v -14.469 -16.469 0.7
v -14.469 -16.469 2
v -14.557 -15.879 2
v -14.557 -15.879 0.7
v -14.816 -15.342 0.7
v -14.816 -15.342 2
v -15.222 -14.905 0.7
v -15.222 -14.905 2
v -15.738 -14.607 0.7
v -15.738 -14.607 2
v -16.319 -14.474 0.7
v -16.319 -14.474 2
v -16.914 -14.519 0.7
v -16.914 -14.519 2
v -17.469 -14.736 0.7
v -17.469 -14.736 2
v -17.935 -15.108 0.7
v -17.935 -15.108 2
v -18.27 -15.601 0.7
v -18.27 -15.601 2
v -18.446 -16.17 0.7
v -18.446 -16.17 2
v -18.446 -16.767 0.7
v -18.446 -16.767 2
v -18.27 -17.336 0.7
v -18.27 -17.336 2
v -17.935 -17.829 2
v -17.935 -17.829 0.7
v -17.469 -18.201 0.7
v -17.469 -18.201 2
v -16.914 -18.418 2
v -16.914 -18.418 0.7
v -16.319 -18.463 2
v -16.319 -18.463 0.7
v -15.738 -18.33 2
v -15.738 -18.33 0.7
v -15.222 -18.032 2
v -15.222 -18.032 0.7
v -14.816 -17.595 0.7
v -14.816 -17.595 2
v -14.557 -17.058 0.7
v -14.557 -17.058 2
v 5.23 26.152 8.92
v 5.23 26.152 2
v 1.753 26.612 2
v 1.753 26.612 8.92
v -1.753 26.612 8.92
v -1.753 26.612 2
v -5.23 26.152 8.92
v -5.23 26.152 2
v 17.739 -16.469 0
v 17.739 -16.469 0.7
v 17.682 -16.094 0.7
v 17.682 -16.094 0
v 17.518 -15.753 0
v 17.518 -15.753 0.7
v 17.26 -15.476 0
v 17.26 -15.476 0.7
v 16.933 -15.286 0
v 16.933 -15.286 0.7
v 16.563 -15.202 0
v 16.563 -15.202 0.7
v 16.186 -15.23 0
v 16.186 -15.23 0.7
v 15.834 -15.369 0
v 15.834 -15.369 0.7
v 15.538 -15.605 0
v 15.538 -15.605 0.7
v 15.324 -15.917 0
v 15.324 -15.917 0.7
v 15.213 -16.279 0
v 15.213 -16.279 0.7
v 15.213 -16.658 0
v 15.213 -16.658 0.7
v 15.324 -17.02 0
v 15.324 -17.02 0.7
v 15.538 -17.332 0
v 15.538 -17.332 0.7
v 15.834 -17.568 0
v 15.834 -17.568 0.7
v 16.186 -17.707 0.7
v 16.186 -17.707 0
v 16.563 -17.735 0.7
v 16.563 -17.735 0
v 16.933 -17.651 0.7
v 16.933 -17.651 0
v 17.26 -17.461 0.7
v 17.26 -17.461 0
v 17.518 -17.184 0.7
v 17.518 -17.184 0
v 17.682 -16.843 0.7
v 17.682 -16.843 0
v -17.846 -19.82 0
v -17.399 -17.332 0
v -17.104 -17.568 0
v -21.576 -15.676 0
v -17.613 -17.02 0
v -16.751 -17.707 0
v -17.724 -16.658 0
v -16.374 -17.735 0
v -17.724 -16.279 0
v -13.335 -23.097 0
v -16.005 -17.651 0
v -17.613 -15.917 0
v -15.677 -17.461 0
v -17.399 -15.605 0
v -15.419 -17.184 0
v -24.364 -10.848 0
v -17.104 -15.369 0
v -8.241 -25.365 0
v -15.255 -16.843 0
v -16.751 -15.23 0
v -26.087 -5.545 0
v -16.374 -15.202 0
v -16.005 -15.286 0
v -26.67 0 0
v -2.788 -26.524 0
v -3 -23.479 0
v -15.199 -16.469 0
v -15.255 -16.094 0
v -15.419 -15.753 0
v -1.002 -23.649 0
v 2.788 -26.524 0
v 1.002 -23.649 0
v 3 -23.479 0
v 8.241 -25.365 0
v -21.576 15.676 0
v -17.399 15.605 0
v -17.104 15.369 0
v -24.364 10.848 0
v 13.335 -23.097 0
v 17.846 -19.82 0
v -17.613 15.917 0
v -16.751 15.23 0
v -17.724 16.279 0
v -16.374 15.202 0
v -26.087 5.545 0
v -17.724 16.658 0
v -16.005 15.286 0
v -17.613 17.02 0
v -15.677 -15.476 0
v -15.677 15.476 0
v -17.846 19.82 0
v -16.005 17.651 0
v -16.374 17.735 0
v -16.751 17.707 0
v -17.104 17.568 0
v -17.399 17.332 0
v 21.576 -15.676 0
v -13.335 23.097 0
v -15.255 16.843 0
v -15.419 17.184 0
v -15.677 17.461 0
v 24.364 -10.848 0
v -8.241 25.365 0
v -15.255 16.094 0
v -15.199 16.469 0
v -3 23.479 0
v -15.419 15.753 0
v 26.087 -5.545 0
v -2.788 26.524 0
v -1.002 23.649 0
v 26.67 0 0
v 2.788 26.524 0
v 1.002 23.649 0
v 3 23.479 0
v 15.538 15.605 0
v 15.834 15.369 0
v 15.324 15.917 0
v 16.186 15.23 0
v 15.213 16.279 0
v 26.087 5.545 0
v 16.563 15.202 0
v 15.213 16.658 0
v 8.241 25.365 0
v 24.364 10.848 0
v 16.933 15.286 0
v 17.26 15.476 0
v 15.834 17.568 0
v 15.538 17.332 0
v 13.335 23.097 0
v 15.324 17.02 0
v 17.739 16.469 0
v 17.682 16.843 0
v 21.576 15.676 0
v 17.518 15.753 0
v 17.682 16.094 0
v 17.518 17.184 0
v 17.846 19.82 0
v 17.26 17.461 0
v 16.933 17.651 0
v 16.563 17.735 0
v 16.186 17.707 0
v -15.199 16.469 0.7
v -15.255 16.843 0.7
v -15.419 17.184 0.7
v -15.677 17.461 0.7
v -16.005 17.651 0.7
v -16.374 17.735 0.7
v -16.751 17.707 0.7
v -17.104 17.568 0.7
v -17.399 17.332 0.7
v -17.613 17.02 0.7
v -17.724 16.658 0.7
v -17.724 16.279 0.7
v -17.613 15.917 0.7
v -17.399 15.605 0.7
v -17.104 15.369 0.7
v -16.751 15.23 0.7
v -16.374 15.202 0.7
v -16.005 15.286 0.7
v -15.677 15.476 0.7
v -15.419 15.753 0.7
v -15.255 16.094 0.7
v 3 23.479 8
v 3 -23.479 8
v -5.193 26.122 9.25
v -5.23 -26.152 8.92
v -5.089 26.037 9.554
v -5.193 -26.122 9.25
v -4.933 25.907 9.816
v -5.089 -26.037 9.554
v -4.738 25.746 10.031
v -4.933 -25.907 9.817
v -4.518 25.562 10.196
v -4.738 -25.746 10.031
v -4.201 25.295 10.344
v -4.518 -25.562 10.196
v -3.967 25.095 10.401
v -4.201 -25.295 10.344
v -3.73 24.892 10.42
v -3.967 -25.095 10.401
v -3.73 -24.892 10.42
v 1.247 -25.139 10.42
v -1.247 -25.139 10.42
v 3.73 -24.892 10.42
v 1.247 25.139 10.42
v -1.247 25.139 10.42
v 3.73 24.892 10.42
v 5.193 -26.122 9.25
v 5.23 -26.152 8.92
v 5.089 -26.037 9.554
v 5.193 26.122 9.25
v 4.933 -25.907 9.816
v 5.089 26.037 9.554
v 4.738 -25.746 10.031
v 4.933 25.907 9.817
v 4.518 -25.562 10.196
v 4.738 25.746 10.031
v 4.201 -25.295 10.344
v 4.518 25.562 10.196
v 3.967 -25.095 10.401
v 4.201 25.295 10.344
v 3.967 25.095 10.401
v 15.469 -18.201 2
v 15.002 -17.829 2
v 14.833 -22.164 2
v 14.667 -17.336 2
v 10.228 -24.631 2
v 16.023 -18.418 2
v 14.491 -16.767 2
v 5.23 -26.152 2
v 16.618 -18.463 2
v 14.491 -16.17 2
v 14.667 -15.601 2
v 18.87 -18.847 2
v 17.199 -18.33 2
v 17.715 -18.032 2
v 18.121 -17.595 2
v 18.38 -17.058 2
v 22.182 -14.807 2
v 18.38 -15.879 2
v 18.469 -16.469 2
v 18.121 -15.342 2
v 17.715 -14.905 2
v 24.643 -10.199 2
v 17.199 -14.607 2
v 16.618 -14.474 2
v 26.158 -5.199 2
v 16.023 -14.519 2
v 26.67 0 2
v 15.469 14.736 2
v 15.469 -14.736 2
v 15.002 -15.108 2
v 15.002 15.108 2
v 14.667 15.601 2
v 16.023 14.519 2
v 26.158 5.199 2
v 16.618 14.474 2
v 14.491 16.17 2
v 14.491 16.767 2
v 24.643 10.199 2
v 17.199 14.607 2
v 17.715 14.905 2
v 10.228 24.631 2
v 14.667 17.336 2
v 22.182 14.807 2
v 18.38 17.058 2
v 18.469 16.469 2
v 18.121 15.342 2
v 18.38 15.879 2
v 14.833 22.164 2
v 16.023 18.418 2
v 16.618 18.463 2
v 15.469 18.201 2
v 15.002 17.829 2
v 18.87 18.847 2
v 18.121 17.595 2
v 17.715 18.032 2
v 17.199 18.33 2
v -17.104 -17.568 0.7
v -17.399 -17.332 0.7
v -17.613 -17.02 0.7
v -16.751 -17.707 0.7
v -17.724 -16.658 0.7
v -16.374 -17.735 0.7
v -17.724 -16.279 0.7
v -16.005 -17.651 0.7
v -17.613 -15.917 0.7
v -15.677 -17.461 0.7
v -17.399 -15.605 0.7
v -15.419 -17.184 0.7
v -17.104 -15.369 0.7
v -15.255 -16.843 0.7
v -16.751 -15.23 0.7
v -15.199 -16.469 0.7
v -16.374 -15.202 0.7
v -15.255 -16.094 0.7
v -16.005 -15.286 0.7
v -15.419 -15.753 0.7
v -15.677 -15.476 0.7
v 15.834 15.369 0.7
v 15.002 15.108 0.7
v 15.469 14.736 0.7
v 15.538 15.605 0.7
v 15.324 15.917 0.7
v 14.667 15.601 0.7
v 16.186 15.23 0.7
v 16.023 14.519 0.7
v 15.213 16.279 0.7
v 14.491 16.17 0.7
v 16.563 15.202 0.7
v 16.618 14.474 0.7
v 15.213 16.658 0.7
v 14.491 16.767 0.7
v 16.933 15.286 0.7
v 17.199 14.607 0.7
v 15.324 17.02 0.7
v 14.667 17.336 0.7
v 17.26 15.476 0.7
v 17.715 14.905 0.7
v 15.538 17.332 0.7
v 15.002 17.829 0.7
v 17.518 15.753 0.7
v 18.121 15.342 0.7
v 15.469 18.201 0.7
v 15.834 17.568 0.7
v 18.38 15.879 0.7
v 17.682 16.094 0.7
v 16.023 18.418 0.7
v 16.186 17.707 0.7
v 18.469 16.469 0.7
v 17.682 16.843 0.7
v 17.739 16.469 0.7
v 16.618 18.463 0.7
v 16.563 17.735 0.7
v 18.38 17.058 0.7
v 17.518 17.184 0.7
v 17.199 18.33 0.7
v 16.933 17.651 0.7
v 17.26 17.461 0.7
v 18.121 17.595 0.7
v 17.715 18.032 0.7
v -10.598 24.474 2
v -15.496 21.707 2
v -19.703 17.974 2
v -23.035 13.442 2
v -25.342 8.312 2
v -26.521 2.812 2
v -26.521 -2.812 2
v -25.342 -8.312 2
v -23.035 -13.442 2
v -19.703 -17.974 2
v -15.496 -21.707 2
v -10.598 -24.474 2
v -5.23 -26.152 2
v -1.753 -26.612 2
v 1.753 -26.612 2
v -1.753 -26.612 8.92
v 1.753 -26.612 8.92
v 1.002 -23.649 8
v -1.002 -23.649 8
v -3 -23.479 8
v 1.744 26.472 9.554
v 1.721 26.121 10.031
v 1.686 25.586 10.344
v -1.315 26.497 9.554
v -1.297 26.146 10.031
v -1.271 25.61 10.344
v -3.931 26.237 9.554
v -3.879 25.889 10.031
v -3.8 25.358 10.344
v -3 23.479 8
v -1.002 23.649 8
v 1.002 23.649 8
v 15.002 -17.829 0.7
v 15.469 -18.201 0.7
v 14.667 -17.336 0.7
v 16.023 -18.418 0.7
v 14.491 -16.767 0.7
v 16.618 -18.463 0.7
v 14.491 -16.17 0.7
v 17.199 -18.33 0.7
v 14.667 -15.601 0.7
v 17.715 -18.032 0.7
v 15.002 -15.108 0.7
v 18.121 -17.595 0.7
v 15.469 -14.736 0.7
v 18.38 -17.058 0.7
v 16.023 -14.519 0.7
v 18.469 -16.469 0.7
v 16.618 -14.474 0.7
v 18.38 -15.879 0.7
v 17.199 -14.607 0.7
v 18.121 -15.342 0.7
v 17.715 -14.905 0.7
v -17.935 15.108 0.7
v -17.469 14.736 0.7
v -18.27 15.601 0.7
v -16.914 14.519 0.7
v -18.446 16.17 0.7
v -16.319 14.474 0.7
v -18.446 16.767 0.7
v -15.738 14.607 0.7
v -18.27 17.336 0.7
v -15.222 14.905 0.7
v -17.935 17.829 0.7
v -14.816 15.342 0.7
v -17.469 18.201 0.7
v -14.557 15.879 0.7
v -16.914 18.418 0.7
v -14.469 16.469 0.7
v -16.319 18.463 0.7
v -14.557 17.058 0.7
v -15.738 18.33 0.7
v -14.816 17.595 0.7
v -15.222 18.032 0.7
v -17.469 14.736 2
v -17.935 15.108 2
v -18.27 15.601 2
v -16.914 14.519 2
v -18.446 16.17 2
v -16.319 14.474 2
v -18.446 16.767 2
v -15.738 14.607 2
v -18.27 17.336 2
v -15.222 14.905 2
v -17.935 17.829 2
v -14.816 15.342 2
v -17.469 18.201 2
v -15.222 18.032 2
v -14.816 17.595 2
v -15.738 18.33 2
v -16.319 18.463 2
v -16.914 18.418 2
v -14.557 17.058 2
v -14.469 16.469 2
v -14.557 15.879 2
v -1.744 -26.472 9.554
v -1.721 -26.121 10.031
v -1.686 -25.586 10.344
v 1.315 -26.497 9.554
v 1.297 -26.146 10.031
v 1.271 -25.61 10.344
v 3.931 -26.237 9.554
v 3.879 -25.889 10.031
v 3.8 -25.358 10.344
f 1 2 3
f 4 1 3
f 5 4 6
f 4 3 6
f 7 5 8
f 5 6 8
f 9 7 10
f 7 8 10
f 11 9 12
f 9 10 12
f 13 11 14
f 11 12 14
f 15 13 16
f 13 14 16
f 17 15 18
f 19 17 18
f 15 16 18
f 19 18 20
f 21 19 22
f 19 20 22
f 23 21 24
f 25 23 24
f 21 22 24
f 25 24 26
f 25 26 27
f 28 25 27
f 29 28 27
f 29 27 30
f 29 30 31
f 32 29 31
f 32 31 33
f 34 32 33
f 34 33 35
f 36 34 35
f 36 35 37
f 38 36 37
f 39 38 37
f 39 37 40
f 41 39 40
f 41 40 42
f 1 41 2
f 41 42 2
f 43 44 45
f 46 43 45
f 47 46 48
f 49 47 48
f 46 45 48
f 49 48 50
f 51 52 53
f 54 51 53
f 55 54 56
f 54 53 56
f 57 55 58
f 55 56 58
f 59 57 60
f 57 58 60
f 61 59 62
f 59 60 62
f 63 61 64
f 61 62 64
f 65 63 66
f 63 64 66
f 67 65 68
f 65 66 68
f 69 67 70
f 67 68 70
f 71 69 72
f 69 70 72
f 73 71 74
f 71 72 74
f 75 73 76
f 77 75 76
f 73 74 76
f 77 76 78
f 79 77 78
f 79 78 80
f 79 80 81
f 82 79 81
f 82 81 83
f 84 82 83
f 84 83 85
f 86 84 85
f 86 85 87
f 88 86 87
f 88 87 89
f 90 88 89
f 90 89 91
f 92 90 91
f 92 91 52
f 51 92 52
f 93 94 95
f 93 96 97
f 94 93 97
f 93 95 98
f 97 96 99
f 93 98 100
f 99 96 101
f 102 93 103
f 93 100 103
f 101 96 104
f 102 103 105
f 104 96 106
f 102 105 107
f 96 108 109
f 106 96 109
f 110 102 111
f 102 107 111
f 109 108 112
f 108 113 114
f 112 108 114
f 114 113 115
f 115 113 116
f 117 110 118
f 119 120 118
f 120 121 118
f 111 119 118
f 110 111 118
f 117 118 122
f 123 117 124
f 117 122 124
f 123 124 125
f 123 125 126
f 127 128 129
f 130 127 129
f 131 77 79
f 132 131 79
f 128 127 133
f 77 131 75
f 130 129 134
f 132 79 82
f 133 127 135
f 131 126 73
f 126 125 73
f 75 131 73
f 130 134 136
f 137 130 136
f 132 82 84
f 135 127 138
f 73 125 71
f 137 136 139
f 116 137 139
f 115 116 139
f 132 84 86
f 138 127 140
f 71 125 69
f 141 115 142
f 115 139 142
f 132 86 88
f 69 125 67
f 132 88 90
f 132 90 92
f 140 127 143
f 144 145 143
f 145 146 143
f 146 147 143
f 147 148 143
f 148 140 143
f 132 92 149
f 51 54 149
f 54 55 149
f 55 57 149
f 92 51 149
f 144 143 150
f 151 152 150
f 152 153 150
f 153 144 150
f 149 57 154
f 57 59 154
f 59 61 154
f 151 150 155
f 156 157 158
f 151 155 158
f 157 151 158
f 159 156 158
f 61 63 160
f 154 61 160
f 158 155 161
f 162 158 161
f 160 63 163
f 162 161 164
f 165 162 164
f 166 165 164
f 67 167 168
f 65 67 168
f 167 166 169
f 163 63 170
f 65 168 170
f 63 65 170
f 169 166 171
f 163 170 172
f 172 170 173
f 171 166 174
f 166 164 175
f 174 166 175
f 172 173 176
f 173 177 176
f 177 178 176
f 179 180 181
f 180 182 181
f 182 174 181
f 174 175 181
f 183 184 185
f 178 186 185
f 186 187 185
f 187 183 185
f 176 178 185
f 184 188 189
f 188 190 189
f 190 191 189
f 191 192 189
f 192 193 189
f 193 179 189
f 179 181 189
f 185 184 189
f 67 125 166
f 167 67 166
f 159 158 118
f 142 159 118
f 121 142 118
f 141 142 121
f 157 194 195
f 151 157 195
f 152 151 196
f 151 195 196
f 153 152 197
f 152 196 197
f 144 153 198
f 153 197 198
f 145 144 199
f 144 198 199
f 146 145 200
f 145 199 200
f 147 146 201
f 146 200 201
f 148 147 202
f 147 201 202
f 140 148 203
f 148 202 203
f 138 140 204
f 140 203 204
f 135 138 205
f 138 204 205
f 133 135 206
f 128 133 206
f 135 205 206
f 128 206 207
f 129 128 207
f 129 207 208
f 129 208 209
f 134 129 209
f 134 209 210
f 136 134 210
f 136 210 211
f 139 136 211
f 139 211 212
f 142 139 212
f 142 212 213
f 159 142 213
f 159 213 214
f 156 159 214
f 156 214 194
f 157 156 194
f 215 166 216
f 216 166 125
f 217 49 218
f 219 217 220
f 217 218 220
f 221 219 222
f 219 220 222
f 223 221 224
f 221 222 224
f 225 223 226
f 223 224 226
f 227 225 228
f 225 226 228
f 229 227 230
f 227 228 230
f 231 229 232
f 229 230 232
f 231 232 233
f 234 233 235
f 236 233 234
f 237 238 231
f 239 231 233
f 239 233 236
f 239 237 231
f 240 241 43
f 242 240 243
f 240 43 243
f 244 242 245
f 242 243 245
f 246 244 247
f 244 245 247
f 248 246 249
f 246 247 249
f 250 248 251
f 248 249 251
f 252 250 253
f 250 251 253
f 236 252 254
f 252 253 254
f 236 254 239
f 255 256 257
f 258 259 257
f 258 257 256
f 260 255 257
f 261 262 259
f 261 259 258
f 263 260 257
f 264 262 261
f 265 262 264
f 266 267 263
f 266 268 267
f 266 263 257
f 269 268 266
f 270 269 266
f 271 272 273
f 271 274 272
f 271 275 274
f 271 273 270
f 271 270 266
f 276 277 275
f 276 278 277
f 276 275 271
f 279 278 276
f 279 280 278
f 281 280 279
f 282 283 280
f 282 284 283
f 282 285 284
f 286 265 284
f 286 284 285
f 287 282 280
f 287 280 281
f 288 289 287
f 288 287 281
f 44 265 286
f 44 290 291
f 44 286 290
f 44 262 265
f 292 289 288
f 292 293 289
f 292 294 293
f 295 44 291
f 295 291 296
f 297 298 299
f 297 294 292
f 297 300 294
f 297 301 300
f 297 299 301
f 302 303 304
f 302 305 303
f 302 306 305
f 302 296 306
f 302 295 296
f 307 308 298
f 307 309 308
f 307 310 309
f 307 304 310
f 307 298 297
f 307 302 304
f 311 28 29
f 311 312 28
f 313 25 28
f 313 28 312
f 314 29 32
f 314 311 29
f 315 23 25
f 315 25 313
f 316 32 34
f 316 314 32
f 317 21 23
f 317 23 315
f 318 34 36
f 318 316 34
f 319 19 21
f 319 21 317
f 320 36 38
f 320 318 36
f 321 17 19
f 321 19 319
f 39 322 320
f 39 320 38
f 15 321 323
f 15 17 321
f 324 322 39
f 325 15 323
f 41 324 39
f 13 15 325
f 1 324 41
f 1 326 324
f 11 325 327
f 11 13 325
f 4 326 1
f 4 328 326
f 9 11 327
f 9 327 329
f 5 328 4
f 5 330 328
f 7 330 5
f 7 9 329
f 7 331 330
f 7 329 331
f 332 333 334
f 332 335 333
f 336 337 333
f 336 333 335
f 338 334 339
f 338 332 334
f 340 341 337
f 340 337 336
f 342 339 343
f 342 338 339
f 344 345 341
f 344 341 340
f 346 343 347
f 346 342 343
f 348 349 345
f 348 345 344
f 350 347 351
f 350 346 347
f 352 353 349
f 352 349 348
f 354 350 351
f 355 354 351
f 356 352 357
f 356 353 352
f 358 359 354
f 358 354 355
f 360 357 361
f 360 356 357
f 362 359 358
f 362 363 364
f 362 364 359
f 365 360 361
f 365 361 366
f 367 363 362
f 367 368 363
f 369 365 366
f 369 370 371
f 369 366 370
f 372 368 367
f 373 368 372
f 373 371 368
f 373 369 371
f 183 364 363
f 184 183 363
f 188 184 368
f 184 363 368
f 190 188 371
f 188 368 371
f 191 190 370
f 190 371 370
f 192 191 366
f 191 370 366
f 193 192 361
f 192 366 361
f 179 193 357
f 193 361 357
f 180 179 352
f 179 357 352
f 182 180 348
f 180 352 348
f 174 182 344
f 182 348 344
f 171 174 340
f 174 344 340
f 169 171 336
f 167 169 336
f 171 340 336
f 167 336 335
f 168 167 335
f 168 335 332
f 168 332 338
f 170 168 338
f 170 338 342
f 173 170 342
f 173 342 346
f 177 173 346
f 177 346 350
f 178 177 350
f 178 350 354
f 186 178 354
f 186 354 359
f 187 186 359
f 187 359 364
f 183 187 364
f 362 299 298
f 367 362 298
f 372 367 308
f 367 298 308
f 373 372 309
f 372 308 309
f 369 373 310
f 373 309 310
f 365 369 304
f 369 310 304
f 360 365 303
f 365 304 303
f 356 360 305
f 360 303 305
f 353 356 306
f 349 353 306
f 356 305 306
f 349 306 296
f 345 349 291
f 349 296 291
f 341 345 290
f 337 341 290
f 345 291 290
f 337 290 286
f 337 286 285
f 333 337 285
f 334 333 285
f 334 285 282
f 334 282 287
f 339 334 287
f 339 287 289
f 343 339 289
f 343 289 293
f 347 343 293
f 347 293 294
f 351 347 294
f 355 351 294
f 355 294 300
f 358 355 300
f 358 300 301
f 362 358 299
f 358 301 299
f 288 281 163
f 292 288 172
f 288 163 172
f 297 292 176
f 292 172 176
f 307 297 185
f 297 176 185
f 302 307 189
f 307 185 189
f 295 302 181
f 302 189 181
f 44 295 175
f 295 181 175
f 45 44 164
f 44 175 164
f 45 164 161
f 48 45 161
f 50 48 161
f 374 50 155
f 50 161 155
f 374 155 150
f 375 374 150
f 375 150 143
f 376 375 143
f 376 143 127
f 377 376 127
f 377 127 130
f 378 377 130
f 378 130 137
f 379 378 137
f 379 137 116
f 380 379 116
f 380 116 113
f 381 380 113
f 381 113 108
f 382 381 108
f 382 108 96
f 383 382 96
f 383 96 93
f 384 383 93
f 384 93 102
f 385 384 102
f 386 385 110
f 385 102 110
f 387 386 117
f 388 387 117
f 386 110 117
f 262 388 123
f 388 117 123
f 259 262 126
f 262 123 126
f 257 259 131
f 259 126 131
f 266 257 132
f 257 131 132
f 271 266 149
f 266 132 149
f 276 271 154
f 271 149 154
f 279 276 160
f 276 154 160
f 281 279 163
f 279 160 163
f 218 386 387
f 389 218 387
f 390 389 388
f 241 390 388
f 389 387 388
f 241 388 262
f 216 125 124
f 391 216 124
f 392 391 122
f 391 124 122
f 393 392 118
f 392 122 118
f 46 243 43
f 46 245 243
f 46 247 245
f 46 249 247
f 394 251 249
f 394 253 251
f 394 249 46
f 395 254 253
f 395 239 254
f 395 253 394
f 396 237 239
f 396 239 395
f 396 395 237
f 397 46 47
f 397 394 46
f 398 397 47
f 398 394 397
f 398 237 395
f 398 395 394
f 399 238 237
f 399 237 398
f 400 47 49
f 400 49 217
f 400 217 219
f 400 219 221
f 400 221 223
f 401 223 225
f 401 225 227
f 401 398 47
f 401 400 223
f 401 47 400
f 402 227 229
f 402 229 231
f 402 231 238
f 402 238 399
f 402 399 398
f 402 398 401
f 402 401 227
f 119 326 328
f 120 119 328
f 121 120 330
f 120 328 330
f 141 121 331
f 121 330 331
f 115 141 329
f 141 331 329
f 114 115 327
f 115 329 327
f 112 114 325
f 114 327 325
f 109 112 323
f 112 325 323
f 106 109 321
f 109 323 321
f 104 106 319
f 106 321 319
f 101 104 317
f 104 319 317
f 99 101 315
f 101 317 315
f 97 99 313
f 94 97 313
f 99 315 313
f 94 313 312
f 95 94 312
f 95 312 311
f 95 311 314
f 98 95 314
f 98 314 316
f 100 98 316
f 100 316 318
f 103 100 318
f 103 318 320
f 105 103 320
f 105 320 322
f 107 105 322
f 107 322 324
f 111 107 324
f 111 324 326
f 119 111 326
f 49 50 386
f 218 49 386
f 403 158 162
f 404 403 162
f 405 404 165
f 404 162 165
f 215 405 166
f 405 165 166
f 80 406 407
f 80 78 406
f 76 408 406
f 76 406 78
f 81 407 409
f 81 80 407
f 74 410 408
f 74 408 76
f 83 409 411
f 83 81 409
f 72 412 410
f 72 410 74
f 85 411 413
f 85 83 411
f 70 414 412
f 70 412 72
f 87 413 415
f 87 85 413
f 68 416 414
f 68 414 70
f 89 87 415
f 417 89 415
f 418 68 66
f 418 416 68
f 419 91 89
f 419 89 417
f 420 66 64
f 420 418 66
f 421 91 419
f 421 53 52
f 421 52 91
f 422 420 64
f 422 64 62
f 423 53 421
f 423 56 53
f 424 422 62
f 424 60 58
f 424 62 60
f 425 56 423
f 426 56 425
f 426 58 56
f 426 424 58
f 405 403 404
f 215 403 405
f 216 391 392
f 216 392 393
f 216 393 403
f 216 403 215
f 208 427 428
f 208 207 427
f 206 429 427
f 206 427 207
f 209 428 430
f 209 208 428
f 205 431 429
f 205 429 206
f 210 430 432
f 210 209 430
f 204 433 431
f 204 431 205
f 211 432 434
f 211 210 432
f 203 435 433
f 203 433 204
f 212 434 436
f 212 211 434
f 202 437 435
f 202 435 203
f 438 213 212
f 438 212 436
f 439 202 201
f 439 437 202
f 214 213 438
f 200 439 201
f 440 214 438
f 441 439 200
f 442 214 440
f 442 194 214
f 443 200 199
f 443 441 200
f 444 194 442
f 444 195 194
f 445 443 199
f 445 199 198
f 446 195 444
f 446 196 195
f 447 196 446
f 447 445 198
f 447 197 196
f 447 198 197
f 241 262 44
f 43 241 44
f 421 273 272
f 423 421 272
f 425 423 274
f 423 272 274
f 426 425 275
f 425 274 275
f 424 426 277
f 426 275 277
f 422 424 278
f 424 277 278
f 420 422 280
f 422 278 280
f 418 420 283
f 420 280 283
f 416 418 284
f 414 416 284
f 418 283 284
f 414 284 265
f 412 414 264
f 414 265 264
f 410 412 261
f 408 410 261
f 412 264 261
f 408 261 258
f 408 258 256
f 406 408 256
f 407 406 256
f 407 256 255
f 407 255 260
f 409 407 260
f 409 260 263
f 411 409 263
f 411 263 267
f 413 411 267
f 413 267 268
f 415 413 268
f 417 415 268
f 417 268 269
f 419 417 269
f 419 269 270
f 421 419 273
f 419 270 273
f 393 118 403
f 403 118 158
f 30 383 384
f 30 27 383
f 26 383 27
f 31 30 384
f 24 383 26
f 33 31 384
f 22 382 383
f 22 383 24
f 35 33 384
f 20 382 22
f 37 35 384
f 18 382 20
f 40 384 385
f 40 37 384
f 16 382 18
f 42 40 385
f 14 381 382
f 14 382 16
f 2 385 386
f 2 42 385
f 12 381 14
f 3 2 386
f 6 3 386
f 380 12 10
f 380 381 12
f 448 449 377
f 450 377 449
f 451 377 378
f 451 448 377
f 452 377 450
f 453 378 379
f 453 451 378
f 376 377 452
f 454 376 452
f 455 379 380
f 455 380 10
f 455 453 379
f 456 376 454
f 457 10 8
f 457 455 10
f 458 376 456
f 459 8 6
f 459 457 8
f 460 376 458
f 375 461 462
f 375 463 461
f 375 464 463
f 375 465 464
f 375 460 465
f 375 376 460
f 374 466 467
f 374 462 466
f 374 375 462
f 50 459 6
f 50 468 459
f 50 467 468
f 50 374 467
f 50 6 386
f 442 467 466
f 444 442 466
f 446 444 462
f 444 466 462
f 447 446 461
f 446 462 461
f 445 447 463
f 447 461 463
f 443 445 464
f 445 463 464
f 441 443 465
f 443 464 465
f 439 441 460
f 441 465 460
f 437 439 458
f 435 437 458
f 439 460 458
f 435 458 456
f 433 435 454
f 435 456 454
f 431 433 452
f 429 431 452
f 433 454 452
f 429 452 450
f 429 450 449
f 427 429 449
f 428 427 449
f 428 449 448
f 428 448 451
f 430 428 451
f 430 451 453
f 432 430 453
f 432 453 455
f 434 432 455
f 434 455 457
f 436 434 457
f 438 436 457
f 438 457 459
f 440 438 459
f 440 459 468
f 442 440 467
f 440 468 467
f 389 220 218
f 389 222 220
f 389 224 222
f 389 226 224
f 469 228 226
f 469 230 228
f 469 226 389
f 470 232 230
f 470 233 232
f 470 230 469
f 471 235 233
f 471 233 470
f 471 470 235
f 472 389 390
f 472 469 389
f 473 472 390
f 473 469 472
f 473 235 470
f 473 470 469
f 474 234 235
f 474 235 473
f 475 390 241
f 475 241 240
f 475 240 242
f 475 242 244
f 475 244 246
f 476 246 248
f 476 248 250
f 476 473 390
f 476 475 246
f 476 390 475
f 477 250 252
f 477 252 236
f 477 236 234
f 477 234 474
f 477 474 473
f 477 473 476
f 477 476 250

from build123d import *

# Parameters (mm, degrees)
F0_R      = 26.67
F1_DEPTH  = 2
F5_DEPTH  = 8.42
F6_R      = 1.5
F8_DEPTH  = 8
F9_R      = 1.27
F11_DEPTH = 2
F10_R     = 2
F12_DEPTH = 1.3


with BuildPart() as f1:
    # F0 (on Top) → F1 (new body)
    with BuildSketch(Plane.XY):
        Circle(F0_R)
    extrude(amount=F1_DEPTH)

    # F4 (on face) → F5 (join)
    with BuildSketch(Plane.XY.offset(2)):
        with BuildLine():
            ThreePointArc((5.23, 26.15217), (0, 26.67), (-5.23, 26.15217))
            Line((-5.23, 26.15217), (-5.23, -26.15217))
            ThreePointArc((-5.23, -26.15217), (0, -26.67), (5.23, -26.15217))
            Line((5.23, -26.15217), (5.23, 26.15217))
        make_face()
    extrude(amount=F5_DEPTH)

    # F6
    f6_edges = [f1.edges().sort_by_distance(p)[0] for p in [
        (5.23, 0, 10.42),
        (0, 26.67, 10.42),
        (-5.23, 0, 10.42),
        (0, -26.67, 10.42),
    ]]
    fillet(f6_edges, radius=F6_R)

    # F7 (on face) → F8 (cut)
    with BuildSketch(Plane(origin=(0, 0, 0), x_dir=(1, 0, 0), z_dir=(0, 0, -1))):
        with BuildLine():
            ThreePointArc((3, 23.479116), (0, 23.67), (-3, 23.479116))
            Line((-3, 23.479116), (-3, -23.479116))
            ThreePointArc((-3, -23.479116), (0, -23.67), (3, -23.479116))
            Line((3, -23.479116), (3, 23.479116))
        make_face()
    extrude(amount=-F8_DEPTH, mode=Mode.SUBTRACT)

    # F9 (on face) → F11 (cut)
    with BuildSketch(Plane.XY.offset(2)):
        with Locations((-16.468517, 16.468517)):
            Circle(F9_R)
        with Locations((-16.468517, -16.468517)):
            Circle(F9_R)
        with Locations((16.468517, -16.468517)):
            Circle(F9_R)
        with Locations((16.468517, 16.468517)):
            Circle(F9_R)
    extrude(amount=-F11_DEPTH, mode=Mode.SUBTRACT)

    # F10 (on face) → F12 (cut)
    with BuildSketch(Plane.XY.offset(2)):
        with Locations((-16.468517, 16.468517)):
            Circle(F10_R)
        with Locations((-16.468517, -16.468517)):
            Circle(F10_R)
        with Locations((16.468517, -16.468517)):
            Circle(F10_R)
        with Locations((16.468517, 16.468517)):
            Circle(F10_R)
    extrude(amount=-F12_DEPTH, mode=Mode.SUBTRACT)


solid = f1.part
